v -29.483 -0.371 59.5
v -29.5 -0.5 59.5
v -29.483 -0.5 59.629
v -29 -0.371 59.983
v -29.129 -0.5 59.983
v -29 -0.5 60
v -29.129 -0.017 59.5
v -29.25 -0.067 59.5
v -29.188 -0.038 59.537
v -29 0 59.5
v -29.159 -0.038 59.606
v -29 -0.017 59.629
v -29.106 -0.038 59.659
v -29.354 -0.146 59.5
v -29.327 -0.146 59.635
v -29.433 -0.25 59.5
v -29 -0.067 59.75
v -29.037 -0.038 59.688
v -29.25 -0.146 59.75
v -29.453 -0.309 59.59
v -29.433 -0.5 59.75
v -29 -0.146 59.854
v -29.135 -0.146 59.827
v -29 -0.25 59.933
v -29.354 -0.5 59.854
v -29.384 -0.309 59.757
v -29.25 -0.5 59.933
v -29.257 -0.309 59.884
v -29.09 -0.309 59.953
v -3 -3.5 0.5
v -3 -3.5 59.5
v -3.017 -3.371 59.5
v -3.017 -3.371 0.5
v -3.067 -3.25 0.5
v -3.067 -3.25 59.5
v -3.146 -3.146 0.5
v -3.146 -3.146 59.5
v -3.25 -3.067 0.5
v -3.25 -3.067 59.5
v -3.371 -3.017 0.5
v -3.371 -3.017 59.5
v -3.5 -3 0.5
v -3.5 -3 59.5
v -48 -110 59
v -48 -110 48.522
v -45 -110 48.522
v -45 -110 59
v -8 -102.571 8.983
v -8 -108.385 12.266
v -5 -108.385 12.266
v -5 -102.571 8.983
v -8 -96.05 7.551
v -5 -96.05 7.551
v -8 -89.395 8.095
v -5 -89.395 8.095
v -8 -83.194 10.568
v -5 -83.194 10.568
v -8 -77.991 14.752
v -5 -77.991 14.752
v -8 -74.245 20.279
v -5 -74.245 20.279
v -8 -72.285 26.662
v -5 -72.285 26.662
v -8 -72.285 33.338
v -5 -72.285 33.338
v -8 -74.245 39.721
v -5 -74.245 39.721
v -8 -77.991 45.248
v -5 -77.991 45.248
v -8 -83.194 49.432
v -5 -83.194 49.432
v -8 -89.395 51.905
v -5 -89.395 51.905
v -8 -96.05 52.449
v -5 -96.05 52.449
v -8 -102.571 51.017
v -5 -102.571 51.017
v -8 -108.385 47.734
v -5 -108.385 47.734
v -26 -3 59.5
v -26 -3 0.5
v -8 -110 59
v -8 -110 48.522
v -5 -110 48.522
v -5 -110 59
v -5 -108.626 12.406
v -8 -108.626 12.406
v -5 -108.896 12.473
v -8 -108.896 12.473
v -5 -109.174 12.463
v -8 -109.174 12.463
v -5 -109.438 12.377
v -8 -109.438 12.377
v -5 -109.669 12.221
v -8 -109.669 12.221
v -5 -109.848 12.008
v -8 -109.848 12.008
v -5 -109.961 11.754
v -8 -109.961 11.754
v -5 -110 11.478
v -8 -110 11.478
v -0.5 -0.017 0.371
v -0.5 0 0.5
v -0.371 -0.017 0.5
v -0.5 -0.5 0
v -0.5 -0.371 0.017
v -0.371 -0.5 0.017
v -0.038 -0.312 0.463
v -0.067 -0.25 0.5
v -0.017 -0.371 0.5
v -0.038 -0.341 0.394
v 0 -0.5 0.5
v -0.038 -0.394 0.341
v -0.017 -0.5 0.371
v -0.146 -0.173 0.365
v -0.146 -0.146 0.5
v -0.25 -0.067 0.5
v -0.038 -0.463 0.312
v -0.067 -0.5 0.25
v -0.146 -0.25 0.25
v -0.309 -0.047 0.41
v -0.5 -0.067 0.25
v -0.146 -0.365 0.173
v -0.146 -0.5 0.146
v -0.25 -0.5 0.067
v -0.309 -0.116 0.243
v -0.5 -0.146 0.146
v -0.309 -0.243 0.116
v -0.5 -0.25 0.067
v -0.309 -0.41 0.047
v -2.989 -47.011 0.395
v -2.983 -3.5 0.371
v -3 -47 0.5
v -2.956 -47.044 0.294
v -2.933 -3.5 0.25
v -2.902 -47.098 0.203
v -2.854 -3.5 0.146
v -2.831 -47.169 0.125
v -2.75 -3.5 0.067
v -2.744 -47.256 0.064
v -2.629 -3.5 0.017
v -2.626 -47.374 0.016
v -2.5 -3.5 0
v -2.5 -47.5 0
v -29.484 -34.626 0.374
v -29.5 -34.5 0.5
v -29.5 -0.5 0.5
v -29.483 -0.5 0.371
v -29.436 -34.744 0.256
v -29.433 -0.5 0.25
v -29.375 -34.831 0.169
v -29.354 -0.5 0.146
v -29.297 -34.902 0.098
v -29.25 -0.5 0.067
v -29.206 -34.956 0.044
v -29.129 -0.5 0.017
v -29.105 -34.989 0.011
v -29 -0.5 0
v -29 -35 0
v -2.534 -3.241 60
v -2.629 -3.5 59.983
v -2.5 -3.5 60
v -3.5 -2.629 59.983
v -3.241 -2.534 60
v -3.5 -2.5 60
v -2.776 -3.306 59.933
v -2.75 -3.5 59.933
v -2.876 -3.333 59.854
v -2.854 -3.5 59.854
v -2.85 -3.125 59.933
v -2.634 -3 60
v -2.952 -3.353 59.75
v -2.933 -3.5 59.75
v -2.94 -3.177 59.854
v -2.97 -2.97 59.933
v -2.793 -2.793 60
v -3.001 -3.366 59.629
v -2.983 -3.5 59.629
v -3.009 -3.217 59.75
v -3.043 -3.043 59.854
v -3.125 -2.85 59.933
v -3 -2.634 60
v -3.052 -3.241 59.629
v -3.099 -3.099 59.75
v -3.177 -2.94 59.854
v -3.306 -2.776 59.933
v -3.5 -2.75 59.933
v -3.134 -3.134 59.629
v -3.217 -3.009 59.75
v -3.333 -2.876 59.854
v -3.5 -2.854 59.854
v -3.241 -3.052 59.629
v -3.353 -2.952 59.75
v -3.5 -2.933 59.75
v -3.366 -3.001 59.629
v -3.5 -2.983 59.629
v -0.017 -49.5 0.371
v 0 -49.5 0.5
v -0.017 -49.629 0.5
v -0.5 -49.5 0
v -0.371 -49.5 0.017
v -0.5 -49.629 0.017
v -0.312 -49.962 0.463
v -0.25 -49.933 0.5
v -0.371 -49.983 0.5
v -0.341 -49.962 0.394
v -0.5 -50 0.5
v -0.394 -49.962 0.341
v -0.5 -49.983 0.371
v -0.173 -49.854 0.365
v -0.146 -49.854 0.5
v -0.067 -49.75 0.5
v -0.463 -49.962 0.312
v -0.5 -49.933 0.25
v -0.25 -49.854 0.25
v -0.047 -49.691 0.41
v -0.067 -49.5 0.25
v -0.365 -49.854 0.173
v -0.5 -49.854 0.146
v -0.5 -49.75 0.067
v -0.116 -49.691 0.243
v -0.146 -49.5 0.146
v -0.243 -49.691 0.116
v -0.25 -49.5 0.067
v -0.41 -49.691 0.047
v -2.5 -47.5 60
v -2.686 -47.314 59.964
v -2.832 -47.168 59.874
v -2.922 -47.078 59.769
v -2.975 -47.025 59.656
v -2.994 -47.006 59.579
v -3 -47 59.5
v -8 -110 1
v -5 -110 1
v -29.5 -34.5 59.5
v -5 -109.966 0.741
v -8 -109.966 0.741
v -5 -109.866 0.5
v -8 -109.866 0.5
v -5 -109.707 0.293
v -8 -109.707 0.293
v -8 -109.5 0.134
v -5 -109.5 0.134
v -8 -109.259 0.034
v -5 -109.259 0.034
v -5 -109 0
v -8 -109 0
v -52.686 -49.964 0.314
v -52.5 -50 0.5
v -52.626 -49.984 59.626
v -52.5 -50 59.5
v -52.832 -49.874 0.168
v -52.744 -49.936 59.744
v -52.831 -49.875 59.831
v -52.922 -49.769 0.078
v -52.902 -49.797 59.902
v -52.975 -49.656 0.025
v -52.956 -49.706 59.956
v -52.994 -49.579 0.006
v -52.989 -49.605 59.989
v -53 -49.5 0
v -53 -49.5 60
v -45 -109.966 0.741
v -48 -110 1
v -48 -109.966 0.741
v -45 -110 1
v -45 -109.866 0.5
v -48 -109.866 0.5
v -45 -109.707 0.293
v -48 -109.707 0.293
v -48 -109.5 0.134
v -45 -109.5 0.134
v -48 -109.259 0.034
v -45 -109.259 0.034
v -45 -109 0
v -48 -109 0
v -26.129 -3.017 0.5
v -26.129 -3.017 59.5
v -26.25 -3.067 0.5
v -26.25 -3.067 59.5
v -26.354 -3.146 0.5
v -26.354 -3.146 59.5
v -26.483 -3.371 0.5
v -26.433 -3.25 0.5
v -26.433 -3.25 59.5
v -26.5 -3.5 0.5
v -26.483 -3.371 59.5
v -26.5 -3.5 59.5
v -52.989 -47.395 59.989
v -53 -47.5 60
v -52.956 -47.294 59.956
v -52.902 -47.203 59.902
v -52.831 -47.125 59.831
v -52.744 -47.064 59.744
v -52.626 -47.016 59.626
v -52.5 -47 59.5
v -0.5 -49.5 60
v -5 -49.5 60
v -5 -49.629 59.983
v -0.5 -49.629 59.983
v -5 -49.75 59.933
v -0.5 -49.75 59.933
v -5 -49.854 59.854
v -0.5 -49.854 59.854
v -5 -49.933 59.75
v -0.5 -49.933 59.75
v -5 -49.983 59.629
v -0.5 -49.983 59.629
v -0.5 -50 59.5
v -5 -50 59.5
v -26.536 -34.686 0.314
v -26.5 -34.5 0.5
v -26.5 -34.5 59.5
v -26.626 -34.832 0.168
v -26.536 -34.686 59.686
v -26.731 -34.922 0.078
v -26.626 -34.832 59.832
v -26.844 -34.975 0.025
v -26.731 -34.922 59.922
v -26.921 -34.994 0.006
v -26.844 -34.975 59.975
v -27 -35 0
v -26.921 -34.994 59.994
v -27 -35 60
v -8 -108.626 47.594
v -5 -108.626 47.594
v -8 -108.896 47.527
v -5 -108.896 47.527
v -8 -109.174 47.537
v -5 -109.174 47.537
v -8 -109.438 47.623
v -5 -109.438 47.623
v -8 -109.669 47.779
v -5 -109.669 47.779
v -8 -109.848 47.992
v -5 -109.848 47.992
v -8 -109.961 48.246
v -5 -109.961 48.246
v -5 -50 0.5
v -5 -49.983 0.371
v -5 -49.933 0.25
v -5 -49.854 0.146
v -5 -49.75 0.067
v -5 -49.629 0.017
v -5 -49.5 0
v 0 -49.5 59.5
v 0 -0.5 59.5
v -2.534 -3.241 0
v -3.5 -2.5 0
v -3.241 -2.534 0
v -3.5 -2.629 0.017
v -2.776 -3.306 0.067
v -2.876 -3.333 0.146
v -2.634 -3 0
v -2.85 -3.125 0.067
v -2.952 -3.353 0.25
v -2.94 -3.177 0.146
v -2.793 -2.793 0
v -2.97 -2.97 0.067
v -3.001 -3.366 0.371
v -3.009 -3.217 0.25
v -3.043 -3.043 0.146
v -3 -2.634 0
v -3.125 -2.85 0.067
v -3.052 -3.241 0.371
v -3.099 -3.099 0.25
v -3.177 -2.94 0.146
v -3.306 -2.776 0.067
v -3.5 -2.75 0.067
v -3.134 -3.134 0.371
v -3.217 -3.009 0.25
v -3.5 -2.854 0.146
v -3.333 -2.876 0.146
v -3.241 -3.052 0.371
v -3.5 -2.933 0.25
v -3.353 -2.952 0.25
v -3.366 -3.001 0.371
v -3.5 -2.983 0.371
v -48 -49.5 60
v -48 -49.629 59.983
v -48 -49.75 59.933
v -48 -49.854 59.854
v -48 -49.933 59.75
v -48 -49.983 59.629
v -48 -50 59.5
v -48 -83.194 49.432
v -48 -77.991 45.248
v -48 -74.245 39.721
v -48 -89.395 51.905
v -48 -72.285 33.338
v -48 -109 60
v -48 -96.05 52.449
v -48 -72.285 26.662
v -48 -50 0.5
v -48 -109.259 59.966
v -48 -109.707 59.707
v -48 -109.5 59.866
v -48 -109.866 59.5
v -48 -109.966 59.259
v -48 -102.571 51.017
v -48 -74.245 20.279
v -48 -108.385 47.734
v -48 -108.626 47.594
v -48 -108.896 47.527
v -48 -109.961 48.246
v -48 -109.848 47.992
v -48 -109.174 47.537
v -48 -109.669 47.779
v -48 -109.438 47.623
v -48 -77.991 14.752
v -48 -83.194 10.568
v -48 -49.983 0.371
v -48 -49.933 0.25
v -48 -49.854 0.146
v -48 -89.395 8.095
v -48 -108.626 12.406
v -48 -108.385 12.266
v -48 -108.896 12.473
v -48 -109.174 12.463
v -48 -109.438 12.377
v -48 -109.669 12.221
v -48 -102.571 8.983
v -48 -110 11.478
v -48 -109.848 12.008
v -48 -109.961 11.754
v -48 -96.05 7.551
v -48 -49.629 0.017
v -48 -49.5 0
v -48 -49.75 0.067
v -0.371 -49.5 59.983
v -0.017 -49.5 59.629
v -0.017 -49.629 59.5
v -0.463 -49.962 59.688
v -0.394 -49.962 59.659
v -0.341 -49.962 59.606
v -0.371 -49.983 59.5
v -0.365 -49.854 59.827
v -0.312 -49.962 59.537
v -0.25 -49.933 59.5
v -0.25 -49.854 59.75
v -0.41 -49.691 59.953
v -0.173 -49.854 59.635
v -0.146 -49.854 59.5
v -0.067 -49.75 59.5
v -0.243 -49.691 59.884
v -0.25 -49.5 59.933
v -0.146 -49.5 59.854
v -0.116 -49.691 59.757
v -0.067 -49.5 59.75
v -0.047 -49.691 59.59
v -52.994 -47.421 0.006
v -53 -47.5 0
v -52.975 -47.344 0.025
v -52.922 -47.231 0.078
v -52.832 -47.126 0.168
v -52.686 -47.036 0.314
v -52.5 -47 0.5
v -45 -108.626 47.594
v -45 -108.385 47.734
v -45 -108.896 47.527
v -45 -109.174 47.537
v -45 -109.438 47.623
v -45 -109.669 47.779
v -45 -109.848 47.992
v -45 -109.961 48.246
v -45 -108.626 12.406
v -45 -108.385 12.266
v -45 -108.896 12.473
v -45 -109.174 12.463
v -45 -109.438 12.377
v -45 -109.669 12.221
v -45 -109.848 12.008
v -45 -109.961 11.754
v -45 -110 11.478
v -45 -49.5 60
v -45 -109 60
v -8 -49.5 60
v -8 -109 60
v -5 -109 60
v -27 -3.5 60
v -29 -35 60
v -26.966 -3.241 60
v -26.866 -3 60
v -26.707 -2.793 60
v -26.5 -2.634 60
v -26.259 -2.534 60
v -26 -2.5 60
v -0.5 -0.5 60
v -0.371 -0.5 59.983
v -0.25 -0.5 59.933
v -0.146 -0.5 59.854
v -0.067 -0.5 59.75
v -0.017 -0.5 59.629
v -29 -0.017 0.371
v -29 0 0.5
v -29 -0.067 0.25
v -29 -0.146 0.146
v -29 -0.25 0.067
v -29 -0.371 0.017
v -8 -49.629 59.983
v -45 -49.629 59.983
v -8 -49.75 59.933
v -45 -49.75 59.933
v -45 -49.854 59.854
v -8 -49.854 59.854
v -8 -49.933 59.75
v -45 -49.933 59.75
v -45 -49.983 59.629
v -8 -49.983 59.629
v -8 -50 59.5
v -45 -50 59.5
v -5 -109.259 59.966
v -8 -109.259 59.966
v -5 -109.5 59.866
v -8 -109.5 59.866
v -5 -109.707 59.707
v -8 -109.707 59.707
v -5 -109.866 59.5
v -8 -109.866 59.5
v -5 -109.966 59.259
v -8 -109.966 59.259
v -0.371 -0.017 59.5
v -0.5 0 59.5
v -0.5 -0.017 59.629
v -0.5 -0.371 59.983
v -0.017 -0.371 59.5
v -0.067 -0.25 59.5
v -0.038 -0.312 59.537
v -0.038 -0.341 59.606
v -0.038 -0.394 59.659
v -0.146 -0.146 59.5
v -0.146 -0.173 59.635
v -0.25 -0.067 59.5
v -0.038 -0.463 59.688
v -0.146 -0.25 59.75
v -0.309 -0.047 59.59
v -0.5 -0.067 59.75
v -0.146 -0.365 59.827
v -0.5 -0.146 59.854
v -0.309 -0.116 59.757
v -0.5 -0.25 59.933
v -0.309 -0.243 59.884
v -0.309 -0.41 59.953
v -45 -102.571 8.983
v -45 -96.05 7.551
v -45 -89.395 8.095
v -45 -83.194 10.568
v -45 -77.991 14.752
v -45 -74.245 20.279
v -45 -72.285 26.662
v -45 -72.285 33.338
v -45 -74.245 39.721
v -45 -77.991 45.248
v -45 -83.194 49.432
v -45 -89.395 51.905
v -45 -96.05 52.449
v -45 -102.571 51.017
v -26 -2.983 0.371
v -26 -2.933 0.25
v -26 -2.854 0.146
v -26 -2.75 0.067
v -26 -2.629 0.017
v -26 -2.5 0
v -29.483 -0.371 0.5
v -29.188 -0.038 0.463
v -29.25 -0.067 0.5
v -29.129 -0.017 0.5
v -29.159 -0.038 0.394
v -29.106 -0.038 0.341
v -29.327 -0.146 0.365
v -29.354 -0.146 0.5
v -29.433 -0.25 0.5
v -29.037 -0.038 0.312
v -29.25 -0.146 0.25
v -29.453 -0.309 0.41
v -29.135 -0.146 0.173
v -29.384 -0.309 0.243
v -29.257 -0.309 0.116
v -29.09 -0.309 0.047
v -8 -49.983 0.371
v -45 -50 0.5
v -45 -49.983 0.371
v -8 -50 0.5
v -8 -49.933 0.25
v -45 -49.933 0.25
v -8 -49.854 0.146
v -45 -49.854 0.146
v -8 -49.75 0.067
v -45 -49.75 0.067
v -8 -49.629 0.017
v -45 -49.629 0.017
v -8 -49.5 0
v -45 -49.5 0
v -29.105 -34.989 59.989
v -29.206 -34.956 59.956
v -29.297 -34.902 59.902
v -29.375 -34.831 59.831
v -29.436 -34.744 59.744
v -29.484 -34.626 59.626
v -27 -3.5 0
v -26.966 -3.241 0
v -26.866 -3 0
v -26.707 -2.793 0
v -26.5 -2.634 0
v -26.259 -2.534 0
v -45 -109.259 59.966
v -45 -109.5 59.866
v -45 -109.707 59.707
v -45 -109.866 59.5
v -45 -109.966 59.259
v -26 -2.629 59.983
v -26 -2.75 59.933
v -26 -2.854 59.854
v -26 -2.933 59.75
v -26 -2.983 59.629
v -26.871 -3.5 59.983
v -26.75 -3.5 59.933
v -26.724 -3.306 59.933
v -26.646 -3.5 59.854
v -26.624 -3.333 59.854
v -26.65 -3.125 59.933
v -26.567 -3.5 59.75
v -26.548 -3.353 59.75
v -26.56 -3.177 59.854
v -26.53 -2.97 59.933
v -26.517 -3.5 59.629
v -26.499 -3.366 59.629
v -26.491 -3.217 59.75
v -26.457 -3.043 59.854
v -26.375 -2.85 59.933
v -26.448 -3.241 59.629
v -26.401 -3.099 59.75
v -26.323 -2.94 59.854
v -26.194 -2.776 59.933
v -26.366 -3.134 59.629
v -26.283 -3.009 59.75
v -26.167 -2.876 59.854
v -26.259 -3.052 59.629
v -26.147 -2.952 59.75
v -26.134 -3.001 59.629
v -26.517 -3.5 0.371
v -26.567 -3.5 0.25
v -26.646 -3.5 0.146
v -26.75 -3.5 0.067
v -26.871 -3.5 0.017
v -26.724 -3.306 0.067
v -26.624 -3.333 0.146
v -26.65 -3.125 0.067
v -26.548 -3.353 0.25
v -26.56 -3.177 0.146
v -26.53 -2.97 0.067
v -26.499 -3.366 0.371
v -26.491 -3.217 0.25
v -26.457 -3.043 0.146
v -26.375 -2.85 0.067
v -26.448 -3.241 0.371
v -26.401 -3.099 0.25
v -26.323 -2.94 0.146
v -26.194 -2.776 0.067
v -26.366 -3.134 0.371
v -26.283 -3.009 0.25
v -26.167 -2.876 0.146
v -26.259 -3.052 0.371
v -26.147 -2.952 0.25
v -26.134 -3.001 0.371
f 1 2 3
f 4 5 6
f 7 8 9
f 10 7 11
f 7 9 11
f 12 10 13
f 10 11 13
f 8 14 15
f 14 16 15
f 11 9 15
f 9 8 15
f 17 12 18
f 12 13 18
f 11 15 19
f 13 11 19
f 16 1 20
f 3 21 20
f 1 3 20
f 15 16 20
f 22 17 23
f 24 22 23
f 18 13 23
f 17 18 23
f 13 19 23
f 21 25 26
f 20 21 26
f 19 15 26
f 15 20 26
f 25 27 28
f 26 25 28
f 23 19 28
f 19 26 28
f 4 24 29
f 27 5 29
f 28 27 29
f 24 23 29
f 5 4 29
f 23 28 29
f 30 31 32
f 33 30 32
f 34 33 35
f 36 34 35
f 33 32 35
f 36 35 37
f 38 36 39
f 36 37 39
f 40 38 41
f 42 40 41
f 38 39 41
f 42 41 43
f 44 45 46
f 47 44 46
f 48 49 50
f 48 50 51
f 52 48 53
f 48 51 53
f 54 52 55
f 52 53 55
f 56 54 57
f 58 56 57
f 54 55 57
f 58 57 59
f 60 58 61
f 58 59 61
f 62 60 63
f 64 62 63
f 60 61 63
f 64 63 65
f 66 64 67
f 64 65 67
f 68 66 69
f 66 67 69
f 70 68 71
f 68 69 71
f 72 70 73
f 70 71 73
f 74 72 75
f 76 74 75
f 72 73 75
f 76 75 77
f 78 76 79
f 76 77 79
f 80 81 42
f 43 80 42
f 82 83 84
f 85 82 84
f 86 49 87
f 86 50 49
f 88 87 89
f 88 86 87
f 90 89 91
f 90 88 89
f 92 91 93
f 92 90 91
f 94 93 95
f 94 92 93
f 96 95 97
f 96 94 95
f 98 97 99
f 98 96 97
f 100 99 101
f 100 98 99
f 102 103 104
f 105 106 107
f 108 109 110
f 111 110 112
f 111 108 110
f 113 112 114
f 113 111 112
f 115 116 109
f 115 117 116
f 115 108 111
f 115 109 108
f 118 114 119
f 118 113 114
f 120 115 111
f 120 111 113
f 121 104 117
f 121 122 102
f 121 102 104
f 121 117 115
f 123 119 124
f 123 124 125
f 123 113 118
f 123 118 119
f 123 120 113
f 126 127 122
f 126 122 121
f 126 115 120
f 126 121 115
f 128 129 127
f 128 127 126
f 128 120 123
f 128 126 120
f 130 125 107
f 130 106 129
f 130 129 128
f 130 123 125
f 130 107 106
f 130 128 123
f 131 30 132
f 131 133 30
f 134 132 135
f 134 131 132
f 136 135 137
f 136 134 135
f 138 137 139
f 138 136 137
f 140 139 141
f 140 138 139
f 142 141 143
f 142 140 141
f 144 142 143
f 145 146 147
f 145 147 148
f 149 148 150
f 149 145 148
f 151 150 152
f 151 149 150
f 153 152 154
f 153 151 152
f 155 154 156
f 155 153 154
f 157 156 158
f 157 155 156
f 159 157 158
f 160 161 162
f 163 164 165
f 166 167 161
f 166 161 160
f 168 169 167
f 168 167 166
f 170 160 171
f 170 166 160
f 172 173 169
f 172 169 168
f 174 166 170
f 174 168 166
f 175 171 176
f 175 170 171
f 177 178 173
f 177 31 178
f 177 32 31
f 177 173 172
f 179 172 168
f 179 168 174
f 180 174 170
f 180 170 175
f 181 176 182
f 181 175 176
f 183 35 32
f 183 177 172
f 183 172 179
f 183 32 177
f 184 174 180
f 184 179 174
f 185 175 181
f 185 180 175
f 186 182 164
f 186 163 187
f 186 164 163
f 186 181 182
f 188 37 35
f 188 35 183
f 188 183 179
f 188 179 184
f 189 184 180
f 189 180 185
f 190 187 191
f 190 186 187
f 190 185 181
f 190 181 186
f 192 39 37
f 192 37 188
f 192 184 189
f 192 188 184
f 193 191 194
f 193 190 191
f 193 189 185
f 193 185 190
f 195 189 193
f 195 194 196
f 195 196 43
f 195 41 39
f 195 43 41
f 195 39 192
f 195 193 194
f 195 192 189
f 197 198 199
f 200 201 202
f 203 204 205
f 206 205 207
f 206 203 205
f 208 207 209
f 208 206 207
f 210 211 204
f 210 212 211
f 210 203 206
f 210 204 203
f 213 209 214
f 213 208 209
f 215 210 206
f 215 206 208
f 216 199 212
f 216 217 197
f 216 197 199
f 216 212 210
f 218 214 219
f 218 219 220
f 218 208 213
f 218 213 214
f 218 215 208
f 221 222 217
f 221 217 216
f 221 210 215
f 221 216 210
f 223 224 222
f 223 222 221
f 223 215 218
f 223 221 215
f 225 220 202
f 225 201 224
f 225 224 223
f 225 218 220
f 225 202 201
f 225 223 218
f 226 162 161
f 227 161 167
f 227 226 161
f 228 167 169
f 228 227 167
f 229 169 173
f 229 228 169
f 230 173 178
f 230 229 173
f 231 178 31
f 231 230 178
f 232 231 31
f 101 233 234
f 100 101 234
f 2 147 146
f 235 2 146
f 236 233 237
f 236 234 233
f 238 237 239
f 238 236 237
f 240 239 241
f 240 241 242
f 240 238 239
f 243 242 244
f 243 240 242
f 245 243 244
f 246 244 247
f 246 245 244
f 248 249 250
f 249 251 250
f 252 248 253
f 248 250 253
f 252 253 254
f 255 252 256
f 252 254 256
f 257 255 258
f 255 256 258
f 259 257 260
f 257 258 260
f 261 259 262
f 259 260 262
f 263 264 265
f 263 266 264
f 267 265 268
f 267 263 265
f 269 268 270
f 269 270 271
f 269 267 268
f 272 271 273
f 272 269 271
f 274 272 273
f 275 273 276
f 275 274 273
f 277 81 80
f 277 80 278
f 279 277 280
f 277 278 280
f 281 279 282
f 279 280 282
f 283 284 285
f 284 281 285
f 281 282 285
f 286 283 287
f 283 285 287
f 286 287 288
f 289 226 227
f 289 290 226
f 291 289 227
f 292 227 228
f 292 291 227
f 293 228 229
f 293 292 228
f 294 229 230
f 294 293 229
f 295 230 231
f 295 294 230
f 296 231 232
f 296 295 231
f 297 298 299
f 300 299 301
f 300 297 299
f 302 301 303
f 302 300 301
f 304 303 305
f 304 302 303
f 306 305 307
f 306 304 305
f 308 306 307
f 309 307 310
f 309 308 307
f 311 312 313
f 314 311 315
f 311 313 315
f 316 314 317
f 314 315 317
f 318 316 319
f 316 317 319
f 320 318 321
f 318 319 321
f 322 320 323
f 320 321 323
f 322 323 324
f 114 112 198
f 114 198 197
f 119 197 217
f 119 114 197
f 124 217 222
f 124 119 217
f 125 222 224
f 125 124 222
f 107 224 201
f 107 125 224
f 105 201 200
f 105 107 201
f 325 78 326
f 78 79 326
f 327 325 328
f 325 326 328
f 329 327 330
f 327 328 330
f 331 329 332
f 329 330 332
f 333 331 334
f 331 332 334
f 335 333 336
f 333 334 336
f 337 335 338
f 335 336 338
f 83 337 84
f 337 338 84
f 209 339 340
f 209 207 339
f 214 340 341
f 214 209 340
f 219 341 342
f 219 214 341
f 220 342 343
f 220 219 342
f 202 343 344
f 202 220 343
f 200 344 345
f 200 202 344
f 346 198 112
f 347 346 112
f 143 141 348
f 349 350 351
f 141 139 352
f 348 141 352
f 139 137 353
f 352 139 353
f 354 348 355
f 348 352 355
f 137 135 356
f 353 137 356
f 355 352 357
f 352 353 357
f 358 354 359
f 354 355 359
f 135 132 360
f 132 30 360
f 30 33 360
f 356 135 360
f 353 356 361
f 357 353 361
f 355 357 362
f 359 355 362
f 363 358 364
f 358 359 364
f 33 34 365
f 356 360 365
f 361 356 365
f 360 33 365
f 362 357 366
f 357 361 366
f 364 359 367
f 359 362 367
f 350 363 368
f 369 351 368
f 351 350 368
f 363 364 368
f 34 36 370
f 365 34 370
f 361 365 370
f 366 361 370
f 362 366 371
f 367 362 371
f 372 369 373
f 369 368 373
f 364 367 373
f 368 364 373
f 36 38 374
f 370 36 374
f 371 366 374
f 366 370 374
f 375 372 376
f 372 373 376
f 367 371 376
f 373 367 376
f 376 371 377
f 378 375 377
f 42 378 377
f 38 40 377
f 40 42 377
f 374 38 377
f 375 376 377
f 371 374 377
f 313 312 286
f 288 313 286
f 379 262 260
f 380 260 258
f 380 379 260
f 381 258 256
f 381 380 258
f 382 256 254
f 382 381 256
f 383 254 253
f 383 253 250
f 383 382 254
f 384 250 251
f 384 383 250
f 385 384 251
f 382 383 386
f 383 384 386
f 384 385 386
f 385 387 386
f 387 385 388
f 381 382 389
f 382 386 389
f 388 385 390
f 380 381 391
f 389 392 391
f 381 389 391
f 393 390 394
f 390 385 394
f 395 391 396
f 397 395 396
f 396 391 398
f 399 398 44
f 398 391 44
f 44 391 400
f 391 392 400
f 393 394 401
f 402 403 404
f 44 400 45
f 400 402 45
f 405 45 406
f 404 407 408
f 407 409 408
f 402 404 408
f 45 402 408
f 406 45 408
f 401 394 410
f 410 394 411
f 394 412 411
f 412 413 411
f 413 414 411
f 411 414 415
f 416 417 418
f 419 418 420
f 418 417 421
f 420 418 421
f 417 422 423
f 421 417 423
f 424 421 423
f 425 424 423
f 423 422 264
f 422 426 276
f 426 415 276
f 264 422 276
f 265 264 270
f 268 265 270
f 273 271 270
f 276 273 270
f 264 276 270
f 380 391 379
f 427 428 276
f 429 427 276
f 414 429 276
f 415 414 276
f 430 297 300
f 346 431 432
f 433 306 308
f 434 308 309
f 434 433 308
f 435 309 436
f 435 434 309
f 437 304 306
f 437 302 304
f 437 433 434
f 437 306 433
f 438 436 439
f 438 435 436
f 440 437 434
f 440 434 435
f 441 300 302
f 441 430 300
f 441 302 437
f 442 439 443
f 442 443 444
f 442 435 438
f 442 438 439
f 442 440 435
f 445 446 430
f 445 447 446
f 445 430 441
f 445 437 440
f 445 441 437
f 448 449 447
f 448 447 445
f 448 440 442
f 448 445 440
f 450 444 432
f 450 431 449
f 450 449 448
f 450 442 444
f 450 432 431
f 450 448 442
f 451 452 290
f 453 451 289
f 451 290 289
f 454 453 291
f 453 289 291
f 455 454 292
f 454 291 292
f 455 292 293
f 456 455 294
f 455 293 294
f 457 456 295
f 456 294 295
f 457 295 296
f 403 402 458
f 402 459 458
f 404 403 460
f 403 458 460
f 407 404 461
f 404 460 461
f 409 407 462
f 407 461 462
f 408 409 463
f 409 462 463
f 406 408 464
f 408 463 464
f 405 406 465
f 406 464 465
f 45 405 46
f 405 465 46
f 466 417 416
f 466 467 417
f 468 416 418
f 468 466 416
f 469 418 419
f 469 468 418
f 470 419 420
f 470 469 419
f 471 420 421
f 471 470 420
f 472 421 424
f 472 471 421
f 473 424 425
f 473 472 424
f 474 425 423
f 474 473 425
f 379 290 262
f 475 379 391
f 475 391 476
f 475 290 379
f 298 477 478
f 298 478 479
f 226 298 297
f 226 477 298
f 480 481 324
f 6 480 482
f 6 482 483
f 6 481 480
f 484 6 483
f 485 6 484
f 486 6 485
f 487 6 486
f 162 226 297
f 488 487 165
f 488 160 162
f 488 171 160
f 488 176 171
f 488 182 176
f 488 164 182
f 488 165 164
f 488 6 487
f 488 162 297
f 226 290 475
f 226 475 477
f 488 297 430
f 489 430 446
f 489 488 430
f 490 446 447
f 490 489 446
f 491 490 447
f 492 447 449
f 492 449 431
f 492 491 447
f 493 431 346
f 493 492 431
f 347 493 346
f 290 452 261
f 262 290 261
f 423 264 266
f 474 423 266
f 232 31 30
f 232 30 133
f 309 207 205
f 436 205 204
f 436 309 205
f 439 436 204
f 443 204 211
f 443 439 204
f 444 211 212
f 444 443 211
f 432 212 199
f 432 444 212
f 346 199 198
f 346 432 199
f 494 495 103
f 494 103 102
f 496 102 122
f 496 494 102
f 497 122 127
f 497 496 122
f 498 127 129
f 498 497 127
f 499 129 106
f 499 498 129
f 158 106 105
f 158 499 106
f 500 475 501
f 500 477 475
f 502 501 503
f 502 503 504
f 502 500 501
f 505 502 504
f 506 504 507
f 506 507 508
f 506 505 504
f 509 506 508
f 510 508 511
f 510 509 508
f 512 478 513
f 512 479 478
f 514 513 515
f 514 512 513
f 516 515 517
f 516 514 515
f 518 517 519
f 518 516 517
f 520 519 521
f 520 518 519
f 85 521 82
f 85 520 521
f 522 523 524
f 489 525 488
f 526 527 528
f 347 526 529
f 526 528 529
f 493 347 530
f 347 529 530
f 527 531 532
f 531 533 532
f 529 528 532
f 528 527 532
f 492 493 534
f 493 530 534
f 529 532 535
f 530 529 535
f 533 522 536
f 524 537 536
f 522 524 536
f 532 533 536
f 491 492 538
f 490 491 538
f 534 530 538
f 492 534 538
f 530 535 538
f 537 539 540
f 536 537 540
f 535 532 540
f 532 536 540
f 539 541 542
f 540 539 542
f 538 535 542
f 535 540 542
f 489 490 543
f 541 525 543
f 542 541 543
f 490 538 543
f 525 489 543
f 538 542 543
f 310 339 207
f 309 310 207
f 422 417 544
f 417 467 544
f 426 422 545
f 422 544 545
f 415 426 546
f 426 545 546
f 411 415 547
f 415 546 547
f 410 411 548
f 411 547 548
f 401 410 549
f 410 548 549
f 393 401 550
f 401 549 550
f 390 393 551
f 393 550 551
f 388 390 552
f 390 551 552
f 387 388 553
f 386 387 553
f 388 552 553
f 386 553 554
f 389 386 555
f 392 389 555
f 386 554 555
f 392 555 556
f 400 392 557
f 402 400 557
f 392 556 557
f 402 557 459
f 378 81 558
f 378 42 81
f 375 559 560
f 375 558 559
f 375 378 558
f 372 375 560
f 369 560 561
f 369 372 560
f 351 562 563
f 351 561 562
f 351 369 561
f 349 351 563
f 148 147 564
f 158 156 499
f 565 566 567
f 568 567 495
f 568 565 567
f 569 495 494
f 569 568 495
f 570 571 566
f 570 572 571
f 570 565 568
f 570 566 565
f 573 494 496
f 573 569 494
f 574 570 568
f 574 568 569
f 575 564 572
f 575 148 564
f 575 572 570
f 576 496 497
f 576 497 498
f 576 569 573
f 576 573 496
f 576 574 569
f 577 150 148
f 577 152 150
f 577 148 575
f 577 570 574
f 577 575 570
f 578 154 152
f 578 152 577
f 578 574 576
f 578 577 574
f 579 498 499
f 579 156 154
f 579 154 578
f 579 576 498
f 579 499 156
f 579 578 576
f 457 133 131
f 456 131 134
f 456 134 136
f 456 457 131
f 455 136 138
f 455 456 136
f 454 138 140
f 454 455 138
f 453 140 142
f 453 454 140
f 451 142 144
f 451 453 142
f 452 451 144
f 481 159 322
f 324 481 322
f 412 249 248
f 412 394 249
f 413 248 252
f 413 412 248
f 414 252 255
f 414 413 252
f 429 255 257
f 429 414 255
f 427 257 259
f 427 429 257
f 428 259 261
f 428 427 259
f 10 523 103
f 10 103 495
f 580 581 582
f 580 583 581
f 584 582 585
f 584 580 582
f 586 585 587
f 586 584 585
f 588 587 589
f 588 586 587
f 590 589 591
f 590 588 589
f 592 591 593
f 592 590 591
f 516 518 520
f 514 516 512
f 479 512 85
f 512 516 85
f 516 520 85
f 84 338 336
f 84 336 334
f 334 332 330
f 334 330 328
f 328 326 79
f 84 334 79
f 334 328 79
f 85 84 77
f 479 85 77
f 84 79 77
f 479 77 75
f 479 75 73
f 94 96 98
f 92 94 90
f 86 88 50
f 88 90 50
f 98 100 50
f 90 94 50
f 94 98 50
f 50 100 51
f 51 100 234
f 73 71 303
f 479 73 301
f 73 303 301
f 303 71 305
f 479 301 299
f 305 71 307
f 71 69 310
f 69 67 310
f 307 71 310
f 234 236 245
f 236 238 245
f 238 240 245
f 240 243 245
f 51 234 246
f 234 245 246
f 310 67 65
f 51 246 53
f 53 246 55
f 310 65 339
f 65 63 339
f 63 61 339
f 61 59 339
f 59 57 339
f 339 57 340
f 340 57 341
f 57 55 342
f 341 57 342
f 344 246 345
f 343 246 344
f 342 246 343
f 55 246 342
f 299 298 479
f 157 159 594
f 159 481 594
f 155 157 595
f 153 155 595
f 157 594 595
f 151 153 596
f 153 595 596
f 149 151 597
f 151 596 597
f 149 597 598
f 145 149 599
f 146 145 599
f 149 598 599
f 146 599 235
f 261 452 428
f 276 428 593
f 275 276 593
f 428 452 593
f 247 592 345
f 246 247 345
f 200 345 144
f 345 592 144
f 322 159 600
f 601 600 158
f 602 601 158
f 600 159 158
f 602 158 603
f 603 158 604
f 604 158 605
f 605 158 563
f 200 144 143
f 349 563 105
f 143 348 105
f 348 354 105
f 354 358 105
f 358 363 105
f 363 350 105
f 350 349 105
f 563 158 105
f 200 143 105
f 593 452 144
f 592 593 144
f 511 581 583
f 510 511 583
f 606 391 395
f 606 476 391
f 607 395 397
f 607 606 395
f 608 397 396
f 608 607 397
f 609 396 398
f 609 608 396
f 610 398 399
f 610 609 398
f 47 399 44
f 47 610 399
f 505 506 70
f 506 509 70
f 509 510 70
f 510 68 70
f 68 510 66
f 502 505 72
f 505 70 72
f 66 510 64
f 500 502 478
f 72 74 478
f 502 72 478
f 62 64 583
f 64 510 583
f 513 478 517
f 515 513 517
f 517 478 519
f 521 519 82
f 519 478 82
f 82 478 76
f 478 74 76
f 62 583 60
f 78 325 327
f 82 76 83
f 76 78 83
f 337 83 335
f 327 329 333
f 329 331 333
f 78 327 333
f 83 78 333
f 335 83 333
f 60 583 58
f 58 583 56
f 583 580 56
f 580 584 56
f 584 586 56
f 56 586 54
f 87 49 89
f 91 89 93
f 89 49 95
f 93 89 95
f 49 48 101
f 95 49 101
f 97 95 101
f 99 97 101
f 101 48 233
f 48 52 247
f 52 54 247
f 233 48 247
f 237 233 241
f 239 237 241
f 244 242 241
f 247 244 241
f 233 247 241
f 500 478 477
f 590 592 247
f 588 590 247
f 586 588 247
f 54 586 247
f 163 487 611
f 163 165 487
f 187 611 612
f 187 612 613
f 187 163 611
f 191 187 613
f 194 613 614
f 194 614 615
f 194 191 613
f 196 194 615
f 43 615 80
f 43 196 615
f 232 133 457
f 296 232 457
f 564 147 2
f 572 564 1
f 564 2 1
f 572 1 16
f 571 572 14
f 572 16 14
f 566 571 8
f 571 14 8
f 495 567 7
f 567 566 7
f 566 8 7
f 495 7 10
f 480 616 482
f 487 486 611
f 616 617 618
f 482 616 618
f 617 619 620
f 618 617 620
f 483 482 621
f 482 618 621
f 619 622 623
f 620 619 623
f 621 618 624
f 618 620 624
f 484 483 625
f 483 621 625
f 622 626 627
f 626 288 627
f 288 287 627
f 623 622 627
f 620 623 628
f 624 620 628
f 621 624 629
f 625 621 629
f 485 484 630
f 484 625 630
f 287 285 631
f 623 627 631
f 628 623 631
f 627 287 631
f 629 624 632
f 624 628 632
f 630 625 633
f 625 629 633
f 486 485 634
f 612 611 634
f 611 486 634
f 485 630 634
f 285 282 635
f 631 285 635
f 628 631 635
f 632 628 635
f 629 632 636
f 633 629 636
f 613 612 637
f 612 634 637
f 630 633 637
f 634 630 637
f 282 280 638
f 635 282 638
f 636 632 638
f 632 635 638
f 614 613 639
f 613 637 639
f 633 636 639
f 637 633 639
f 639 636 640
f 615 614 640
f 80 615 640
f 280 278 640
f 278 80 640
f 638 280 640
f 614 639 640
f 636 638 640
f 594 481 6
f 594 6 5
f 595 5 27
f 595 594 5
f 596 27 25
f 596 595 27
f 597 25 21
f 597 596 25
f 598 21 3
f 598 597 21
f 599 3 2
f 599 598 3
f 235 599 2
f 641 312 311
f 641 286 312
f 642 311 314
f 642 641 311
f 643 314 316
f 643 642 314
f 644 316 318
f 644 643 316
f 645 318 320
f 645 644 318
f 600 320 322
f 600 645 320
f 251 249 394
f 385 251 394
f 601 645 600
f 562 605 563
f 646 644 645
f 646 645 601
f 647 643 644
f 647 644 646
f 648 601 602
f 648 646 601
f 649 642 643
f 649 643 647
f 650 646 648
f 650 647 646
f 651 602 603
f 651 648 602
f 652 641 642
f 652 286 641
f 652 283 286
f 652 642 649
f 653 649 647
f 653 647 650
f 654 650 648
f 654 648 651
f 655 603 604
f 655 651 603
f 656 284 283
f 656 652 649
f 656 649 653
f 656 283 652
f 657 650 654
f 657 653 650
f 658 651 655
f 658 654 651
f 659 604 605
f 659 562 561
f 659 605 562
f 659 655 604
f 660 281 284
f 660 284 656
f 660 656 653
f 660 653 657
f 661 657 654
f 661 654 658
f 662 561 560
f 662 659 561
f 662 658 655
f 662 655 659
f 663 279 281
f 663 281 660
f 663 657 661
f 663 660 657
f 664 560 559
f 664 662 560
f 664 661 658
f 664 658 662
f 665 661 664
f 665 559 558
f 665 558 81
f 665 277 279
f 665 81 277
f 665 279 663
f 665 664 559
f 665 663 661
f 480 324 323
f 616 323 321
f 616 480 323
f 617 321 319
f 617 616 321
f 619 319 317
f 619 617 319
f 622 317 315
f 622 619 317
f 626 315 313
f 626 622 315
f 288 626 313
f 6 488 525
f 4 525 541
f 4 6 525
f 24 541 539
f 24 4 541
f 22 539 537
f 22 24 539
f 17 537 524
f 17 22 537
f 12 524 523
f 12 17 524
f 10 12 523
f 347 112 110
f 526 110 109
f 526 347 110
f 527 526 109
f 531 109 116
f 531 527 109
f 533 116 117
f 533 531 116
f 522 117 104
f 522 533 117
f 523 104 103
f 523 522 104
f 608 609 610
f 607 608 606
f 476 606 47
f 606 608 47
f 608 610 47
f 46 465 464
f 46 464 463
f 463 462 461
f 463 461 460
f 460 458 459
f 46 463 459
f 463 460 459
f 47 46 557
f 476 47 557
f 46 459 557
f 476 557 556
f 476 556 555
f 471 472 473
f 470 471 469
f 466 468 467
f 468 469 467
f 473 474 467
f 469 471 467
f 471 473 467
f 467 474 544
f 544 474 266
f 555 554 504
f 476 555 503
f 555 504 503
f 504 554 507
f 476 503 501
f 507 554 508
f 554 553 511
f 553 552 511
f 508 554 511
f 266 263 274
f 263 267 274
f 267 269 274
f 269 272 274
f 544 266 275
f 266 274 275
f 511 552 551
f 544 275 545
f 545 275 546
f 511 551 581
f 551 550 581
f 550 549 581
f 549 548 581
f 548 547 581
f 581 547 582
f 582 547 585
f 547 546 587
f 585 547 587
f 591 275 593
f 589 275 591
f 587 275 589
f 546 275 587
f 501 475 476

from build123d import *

# Parameters (mm, degrees)
F1_DEPTH = 60
F2_R     = 22.5
F3_DEPTH = 50
F4_R     = 1
F5_R     = 0.5


with BuildPart() as f1:
    # F0 (on Top) → F1 (new body)
    with BuildSketch(Plane.XY):
        Polygon((0, -50), (0, 0), (-3, 0), (-29.5, 0), (-29.5, -3), (-29.5, -35), (-26.5, -35), (-26.5, -3), (-3, -3), (-3, -47), (-53, -47), (-53, -50), (-48, -50), (-48, -110), (-45, -110), (-45, -50), (-8, -50), (-8, -110), (-5, -110), (-5, -50), (-3, -50), align=None)
    extrude(amount=F1_DEPTH)

    # F2 (on Right) → F3 (cut)
    with BuildSketch(Plane.YZ):
        with Locations((-94.5363938808, 30)):
            Circle(F2_R)
    extrude(amount=-F3_DEPTH, mode=Mode.SUBTRACT)

    # F4
    f4_edges = [f1.edges().sort_by_distance(p)[0] for p in [
        (-6.5, -110, 13.655983),
        (-6.5, -110, 46.344017),
        (-46.5, -110, 13.655983),
        (-46.5, -110, 46.344017),
        (-6.5, -110, 60),
        (-46.5, -110, 60),
        (-6.5, -110, 0),
        (-46.5, -110, 0),
    ]]
    fillet(f4_edges, radius=F4_R)

    # F5
    f5_edges = [f1.edges().sort_by_distance(p)[0] for p in [
        (-29.5, -35, 30),
        (-26.5, -35, 30),
        (-26.5, -19, 60),
        (-29.5, -17.5, 60),
        (-29.5, -17.5, 0),
        (-26.5, -19, 0),
        (-29.5, 0, 30),
        (-14.75, -3, 0),
        (-14.75, 0, 0),
        (-14.75, -3, 60),
        (-14.75, 0, 60),
        (0, 0, 30),
        (-26.5, -3, 30),
        (-3, -3, 30),
        (-3, -25, 60),
        (0, -25, 60),
        (-3, -25, 0),
        (0, -25, 0),
        (-28, -47, 60),
        (-26.5, -50, 60),
        (-50.5, -50, 60),
        (-2.5, -50, 60),
        (0, -50, 30),
        (-2.5, -50, 0),
        (-28, -47, 0),
        (-26.5, -50, 0),
        (-50.5, -50, 0),
        (-53, -47, 30),
        (-53, -50, 30),
    ]]
    fillet(f5_edges, radius=F5_R)


solid = f1.part
